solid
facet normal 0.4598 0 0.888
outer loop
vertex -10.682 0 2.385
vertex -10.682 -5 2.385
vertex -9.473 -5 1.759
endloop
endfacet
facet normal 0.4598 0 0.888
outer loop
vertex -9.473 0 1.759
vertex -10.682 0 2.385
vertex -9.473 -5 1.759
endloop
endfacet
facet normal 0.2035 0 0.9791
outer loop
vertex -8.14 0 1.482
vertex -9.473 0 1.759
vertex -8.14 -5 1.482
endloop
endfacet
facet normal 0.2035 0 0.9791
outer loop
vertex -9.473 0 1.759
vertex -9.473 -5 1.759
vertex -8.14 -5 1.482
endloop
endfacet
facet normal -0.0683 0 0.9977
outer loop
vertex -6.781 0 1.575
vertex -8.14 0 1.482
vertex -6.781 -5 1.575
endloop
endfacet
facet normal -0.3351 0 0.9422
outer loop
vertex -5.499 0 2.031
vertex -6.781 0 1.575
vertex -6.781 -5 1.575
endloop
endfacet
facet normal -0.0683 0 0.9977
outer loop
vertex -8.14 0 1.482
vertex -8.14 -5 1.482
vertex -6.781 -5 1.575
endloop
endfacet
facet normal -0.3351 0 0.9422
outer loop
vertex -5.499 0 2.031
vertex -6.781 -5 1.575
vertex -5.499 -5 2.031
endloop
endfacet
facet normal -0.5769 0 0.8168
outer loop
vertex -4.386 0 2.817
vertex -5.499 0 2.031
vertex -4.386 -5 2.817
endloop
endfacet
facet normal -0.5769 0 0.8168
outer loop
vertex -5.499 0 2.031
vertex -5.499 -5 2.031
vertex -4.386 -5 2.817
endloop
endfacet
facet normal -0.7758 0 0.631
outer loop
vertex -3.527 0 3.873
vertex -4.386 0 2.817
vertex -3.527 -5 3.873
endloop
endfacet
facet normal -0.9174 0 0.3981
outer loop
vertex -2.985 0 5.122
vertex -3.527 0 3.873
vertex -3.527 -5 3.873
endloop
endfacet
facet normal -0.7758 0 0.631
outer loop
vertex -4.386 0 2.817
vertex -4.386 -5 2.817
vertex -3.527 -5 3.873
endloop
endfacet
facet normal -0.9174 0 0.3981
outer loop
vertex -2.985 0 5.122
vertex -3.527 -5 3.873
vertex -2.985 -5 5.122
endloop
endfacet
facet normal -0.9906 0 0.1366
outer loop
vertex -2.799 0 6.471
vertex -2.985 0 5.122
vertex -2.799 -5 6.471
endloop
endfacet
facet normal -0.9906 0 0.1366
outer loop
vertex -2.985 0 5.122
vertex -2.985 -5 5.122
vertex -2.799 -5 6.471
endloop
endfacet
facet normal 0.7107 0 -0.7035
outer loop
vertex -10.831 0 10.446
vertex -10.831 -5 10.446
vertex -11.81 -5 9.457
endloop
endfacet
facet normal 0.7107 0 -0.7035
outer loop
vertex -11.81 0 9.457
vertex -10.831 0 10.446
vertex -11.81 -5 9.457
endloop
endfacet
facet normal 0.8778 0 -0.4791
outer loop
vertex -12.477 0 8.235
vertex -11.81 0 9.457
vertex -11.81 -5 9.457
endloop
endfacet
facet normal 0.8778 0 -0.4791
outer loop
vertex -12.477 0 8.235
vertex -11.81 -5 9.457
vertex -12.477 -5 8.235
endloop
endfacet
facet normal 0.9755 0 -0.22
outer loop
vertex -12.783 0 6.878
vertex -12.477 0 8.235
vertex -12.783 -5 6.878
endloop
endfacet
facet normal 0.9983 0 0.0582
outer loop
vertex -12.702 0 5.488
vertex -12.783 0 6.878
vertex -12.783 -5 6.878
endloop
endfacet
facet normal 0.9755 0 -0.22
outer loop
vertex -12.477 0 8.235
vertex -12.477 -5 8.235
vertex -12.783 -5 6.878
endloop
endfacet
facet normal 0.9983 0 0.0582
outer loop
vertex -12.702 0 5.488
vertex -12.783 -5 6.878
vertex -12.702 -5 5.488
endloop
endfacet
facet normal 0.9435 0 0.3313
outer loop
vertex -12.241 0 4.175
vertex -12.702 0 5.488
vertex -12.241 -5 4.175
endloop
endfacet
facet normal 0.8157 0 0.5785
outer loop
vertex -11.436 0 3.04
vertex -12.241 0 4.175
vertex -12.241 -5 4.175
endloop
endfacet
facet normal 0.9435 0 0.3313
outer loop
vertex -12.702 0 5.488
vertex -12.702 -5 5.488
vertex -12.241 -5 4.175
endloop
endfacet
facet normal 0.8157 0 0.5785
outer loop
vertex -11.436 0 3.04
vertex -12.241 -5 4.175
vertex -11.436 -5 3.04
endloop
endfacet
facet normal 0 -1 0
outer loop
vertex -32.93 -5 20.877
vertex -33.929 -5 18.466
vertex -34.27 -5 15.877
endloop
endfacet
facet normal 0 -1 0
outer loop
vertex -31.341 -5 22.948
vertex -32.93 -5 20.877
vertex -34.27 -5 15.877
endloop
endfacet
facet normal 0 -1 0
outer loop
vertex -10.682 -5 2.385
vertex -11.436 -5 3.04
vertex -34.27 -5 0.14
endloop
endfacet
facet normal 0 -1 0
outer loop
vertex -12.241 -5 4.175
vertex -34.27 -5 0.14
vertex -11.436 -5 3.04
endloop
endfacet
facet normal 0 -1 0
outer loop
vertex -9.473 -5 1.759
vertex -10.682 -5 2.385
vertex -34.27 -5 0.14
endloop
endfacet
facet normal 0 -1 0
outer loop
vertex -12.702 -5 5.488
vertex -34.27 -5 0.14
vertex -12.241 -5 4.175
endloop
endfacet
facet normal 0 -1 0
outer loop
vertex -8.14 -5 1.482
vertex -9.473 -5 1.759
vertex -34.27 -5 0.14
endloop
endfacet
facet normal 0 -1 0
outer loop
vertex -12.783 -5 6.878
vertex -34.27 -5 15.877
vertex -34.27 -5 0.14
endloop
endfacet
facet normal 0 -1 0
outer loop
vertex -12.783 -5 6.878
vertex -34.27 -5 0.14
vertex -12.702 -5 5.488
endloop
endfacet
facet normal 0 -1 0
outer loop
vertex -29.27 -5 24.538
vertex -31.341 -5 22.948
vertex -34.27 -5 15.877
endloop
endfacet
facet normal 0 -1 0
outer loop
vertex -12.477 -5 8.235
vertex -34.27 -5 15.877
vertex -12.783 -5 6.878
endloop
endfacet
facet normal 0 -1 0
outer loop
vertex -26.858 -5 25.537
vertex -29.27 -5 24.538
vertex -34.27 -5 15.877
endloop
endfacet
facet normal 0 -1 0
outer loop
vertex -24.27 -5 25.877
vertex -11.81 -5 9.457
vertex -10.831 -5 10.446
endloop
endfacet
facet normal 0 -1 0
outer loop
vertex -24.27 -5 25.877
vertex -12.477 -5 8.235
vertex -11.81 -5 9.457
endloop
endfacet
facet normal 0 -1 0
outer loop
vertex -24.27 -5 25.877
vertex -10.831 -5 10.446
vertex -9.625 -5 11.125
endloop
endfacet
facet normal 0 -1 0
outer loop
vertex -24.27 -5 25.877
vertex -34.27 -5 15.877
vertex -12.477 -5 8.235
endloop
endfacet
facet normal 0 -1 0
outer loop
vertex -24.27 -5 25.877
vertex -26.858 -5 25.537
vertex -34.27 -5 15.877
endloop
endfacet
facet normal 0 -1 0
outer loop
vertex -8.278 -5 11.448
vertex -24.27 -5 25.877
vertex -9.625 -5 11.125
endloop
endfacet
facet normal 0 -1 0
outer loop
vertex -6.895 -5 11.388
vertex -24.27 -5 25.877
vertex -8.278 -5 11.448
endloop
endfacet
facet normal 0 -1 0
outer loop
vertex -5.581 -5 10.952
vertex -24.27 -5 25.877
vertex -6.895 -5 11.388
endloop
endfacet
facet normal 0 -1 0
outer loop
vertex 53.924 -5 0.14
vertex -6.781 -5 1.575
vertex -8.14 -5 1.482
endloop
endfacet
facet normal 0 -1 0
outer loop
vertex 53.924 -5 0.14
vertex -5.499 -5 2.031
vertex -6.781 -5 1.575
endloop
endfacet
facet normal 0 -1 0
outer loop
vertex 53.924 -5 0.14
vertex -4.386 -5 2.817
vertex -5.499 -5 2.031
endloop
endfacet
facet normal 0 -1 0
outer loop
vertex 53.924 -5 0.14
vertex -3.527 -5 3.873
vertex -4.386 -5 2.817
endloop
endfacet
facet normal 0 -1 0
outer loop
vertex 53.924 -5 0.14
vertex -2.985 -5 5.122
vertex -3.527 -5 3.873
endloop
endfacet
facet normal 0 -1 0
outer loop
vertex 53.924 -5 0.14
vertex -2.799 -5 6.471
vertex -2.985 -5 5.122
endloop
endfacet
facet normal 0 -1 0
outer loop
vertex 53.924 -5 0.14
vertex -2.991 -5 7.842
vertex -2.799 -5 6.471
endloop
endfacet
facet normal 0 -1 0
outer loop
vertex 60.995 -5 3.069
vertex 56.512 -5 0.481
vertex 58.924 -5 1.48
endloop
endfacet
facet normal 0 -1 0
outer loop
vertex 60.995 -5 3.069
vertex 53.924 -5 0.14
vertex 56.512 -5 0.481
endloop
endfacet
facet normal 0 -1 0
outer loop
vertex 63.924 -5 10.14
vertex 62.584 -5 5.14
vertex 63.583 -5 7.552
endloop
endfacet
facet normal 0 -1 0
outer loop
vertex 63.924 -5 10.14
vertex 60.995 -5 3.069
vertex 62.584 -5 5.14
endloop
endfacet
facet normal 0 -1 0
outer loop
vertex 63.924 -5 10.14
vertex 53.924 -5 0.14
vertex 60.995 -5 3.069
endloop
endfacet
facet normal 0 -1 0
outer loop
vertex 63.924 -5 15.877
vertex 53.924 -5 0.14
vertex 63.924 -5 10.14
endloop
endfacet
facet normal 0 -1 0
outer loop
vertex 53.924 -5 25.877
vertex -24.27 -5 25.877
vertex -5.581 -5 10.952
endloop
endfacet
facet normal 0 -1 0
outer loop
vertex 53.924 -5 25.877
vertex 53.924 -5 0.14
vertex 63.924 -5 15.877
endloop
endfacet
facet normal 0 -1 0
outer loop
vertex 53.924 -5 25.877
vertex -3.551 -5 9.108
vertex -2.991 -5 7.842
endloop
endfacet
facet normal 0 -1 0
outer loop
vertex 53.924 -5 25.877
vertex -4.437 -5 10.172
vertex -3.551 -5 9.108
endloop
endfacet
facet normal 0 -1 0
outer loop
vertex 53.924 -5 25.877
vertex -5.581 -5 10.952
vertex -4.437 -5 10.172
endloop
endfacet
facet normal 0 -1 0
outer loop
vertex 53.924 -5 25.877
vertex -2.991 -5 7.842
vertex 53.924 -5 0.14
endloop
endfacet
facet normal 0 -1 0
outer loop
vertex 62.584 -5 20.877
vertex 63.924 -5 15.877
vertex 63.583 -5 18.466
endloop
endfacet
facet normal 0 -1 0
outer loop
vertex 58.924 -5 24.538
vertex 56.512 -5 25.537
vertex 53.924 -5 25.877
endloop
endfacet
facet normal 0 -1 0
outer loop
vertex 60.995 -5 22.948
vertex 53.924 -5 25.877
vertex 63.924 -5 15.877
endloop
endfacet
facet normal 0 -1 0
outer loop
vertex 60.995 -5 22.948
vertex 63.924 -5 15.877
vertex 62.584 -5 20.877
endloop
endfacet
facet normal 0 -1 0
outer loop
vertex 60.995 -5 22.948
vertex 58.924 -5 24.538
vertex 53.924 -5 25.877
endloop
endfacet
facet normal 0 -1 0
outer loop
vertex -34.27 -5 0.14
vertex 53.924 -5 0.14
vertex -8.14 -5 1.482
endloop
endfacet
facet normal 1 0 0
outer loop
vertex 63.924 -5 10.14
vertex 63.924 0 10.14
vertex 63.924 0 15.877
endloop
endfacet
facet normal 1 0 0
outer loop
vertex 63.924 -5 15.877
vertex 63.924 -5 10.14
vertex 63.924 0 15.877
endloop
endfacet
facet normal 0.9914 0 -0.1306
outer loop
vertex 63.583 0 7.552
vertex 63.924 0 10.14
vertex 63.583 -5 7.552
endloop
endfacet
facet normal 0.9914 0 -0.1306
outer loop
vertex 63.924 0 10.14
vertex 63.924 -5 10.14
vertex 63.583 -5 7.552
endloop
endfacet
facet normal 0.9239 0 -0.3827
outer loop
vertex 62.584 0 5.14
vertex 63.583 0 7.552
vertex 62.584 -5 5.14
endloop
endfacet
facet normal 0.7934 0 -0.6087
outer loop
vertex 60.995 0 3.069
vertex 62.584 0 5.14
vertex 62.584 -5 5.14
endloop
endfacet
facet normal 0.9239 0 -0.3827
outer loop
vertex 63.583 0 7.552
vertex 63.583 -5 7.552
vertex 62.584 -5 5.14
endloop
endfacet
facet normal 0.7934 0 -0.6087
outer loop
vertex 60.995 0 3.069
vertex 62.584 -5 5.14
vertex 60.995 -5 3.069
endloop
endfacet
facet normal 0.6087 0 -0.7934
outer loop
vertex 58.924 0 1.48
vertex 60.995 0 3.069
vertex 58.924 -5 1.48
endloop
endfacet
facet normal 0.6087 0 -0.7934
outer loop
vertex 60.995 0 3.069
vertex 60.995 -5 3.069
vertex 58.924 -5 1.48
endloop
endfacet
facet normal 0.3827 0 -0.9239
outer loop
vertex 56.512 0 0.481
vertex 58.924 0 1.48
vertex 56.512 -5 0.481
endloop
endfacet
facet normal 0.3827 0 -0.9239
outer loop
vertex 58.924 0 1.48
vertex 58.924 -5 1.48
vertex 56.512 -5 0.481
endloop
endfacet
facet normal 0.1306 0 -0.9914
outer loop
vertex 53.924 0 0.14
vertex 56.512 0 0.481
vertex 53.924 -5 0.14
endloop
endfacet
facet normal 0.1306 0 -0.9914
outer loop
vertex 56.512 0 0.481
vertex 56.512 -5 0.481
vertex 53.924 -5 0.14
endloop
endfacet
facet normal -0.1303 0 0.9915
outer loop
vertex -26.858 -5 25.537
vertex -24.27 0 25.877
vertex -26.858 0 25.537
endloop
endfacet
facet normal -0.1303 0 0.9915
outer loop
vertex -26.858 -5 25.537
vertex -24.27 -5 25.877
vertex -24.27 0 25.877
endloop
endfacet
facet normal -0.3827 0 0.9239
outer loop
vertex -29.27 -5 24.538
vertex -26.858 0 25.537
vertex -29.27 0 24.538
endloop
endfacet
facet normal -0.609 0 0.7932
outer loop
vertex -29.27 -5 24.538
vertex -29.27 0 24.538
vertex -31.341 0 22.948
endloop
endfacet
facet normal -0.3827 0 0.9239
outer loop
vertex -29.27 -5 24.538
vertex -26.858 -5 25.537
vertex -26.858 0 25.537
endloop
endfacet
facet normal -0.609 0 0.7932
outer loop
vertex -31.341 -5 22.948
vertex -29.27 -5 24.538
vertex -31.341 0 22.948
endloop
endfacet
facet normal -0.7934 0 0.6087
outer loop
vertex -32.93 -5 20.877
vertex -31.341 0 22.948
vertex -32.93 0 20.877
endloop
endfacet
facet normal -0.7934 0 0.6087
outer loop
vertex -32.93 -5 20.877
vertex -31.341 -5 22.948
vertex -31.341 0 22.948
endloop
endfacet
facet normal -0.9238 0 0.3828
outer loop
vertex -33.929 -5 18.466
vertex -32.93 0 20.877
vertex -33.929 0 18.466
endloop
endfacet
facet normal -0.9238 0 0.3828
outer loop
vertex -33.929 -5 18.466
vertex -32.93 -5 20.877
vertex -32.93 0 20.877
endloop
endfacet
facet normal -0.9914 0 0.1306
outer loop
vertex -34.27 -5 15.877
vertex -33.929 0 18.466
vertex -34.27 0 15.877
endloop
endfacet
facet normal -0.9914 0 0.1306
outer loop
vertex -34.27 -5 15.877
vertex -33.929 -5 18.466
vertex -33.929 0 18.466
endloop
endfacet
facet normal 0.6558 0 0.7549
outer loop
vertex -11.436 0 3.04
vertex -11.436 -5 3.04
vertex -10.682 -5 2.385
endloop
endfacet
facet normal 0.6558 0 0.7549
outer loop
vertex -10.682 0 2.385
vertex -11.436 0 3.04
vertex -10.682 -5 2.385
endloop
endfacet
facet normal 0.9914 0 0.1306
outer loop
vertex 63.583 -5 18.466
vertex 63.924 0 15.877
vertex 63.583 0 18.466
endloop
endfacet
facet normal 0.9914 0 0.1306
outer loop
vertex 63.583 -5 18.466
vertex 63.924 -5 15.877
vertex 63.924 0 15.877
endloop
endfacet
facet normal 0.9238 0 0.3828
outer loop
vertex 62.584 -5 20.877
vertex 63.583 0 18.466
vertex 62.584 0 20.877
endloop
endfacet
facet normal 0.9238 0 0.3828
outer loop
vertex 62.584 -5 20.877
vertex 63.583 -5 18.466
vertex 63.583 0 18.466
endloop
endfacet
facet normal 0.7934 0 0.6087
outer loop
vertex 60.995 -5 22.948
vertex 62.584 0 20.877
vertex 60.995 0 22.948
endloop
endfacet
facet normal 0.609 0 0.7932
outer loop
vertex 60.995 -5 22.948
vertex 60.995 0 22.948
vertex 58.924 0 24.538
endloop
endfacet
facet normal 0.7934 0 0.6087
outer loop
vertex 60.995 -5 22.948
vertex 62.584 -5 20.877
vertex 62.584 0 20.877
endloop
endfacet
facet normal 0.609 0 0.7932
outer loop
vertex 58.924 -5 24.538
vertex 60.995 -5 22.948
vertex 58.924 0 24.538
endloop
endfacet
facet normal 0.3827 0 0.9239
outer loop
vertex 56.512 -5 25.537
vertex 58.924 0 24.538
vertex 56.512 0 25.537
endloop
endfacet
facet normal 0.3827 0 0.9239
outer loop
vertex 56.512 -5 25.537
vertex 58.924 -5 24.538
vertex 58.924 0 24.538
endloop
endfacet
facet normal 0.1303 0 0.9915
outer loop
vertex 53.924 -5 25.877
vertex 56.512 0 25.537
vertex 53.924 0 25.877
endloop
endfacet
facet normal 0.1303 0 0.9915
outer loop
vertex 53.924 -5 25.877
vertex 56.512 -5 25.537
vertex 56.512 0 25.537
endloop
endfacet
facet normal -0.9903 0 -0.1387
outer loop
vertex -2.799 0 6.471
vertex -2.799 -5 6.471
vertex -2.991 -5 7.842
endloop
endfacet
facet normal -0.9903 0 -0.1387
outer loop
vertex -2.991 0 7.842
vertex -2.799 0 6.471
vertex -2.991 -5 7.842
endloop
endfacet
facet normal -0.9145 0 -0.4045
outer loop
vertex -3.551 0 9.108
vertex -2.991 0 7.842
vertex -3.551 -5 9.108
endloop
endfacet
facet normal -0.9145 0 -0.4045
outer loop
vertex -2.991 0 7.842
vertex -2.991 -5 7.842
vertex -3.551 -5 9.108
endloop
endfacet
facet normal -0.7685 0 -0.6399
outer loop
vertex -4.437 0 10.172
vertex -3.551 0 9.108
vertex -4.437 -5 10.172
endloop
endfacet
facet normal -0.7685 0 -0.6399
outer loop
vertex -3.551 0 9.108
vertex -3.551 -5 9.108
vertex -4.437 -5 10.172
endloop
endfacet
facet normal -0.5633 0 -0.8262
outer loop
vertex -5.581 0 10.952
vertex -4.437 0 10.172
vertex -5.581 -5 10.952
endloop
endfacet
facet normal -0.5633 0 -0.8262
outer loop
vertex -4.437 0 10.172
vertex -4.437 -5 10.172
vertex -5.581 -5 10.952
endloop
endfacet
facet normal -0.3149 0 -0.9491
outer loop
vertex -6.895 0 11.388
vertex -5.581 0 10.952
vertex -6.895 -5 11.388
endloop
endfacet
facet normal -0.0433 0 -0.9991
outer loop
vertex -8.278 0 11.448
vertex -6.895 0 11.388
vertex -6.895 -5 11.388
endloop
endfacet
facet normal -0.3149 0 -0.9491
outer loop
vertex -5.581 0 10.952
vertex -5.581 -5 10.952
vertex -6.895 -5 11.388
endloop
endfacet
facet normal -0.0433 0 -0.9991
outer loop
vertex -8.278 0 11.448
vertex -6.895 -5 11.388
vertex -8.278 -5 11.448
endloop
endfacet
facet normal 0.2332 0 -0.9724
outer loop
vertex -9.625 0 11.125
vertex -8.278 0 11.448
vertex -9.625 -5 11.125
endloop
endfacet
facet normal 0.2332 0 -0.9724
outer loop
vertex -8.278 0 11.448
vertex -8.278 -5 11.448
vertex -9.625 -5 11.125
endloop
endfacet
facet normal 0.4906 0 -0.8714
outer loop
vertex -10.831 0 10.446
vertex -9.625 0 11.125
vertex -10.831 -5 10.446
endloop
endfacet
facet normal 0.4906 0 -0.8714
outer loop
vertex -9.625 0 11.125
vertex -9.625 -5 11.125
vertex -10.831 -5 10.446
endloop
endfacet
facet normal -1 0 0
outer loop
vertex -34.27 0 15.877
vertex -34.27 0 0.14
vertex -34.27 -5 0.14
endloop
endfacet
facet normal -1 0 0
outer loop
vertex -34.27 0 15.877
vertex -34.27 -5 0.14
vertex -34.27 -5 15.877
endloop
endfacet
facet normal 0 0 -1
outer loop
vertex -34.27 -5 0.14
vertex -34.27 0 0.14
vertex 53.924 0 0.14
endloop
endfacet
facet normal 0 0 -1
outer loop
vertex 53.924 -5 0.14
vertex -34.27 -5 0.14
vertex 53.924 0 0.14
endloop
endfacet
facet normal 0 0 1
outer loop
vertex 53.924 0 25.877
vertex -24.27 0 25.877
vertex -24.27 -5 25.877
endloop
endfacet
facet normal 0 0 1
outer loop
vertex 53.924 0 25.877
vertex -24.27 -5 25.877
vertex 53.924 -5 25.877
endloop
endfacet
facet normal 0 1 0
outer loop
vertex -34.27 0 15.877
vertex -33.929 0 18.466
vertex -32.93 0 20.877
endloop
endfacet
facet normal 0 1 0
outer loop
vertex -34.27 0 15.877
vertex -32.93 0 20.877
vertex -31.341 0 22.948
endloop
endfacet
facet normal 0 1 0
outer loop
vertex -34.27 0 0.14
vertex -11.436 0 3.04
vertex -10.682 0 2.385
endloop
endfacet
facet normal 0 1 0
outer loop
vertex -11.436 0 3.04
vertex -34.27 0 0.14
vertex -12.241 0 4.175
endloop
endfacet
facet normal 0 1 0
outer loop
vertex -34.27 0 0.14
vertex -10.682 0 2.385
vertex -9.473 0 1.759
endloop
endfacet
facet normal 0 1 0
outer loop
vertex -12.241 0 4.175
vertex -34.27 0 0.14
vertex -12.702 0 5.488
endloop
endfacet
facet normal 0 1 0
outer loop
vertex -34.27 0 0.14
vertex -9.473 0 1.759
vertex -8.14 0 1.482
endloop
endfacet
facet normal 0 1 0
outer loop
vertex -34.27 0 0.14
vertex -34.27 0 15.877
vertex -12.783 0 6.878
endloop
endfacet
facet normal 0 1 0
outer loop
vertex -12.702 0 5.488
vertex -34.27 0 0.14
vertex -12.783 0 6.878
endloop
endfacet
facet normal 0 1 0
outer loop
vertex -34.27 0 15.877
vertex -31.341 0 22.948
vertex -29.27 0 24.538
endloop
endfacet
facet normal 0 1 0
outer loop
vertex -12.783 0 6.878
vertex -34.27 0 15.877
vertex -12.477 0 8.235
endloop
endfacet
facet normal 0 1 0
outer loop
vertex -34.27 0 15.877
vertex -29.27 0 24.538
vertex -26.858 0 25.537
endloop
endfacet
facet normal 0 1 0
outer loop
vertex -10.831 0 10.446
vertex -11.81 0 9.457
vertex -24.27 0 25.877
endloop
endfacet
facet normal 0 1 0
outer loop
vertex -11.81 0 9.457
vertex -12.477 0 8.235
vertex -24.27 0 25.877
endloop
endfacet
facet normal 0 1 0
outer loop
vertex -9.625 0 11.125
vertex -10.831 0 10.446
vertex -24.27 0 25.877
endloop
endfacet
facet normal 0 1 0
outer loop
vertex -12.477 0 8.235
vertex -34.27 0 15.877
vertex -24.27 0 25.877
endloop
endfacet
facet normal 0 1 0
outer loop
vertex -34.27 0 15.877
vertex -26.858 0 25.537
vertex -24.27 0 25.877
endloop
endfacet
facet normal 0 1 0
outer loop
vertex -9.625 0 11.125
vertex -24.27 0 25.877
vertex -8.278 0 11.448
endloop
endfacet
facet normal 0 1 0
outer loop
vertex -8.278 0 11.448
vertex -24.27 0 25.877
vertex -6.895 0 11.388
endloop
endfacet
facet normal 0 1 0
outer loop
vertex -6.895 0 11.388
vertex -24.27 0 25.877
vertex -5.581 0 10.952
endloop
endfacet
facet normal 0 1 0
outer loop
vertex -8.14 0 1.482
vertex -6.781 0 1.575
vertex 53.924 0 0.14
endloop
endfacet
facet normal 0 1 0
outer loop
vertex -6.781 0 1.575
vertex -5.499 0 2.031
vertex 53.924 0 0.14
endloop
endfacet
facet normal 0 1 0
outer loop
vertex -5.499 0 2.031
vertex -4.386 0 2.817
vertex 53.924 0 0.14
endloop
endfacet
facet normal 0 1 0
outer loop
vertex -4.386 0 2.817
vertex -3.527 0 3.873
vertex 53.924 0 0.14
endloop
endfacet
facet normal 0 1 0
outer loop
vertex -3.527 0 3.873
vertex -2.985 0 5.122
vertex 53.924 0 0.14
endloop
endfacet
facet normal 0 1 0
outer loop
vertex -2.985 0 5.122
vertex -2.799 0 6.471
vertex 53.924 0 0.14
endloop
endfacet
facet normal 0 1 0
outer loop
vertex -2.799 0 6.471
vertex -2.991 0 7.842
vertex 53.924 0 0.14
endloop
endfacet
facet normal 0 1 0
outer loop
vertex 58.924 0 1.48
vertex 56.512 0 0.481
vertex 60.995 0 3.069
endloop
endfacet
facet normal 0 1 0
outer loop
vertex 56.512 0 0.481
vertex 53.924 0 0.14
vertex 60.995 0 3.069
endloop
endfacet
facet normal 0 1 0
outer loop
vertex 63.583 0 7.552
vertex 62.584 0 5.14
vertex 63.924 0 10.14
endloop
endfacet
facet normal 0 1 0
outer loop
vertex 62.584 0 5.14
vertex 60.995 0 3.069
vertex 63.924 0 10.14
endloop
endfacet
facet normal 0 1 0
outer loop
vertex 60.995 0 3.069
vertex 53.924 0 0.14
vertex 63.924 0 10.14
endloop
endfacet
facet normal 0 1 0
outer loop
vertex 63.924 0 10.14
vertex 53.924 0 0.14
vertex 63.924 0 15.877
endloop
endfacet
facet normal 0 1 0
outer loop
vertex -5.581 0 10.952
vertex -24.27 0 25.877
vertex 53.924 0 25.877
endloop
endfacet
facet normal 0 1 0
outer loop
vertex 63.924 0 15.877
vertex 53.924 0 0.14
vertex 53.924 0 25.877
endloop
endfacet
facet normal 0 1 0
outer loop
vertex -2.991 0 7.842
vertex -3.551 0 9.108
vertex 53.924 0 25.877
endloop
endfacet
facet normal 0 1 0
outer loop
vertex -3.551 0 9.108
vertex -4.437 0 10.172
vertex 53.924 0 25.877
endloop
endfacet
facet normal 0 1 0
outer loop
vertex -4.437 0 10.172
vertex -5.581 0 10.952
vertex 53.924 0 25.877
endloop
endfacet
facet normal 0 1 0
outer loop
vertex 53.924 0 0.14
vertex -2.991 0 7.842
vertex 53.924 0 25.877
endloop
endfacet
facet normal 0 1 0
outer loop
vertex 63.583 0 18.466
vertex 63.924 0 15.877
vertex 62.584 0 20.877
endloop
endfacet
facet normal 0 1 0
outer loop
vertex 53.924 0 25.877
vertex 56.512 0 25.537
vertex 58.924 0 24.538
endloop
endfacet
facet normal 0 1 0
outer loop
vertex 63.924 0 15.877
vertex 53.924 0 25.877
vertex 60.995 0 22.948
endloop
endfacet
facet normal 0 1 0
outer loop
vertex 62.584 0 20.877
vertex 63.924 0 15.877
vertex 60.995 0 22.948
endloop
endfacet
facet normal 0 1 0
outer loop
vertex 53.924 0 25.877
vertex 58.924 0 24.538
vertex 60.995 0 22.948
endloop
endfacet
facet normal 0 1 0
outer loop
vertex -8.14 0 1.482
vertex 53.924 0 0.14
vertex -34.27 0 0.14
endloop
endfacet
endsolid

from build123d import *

# Parameters (mm, degrees)
F0_W     = 98.194085
F0_H     = 25.737483
F1_DEPTH = 5
F2_R     = 10
F3_R     = 10
F4_R     = 10
F6_DEPTH = 5.001


with BuildPart() as f1:
    # F0 (on Front) → F1 (new body)
    with BuildSketch(Plane.XZ):
        with Locations((14.827024, 13.008618)):
            Rectangle(F0_W, F0_H)
    extrude(amount=F1_DEPTH)

    # F2
    f2_edges = [f1.edges().sort_by_distance(p)[0] for p in [
        (63.924067, -2.5, 25.87736),
    ]]
    fillet(f2_edges, radius=F2_R)

    # F3
    f3_edges = [f1.edges().sort_by_distance(p)[0] for p in [
        (63.924067, -2.5, 0.139877),
    ]]
    fillet(f3_edges, radius=F3_R)

    # F4
    f4_edges = [f1.edges().sort_by_distance(p)[0] for p in [
        (-34.270018, -2.5, 25.87736),
    ]]
    fillet(f4_edges, radius=F4_R)

    # F5 (on face) → F6 (cut, through all)
    with BuildSketch(Plane.XZ.offset(5)):
        with BuildLine():
            ThreePointArc((-10.681925, 2.385375), (-5.498517, 2.031488), (-2.799221, 6.470717))
            ThreePointArc((-2.799221, 6.470717), (-5.581242, 10.951852), (-10.831449, 10.446342))
            ThreePointArc((-10.831449, 10.446342), (-12.782642, 6.877549), (-11.436118, 3.039539))
            Line((-11.436118, 3.039539), (-10.681925, 2.385375))
        make_face()
    extrude(amount=-F6_DEPTH, mode=Mode.SUBTRACT)


solid = f1.part
